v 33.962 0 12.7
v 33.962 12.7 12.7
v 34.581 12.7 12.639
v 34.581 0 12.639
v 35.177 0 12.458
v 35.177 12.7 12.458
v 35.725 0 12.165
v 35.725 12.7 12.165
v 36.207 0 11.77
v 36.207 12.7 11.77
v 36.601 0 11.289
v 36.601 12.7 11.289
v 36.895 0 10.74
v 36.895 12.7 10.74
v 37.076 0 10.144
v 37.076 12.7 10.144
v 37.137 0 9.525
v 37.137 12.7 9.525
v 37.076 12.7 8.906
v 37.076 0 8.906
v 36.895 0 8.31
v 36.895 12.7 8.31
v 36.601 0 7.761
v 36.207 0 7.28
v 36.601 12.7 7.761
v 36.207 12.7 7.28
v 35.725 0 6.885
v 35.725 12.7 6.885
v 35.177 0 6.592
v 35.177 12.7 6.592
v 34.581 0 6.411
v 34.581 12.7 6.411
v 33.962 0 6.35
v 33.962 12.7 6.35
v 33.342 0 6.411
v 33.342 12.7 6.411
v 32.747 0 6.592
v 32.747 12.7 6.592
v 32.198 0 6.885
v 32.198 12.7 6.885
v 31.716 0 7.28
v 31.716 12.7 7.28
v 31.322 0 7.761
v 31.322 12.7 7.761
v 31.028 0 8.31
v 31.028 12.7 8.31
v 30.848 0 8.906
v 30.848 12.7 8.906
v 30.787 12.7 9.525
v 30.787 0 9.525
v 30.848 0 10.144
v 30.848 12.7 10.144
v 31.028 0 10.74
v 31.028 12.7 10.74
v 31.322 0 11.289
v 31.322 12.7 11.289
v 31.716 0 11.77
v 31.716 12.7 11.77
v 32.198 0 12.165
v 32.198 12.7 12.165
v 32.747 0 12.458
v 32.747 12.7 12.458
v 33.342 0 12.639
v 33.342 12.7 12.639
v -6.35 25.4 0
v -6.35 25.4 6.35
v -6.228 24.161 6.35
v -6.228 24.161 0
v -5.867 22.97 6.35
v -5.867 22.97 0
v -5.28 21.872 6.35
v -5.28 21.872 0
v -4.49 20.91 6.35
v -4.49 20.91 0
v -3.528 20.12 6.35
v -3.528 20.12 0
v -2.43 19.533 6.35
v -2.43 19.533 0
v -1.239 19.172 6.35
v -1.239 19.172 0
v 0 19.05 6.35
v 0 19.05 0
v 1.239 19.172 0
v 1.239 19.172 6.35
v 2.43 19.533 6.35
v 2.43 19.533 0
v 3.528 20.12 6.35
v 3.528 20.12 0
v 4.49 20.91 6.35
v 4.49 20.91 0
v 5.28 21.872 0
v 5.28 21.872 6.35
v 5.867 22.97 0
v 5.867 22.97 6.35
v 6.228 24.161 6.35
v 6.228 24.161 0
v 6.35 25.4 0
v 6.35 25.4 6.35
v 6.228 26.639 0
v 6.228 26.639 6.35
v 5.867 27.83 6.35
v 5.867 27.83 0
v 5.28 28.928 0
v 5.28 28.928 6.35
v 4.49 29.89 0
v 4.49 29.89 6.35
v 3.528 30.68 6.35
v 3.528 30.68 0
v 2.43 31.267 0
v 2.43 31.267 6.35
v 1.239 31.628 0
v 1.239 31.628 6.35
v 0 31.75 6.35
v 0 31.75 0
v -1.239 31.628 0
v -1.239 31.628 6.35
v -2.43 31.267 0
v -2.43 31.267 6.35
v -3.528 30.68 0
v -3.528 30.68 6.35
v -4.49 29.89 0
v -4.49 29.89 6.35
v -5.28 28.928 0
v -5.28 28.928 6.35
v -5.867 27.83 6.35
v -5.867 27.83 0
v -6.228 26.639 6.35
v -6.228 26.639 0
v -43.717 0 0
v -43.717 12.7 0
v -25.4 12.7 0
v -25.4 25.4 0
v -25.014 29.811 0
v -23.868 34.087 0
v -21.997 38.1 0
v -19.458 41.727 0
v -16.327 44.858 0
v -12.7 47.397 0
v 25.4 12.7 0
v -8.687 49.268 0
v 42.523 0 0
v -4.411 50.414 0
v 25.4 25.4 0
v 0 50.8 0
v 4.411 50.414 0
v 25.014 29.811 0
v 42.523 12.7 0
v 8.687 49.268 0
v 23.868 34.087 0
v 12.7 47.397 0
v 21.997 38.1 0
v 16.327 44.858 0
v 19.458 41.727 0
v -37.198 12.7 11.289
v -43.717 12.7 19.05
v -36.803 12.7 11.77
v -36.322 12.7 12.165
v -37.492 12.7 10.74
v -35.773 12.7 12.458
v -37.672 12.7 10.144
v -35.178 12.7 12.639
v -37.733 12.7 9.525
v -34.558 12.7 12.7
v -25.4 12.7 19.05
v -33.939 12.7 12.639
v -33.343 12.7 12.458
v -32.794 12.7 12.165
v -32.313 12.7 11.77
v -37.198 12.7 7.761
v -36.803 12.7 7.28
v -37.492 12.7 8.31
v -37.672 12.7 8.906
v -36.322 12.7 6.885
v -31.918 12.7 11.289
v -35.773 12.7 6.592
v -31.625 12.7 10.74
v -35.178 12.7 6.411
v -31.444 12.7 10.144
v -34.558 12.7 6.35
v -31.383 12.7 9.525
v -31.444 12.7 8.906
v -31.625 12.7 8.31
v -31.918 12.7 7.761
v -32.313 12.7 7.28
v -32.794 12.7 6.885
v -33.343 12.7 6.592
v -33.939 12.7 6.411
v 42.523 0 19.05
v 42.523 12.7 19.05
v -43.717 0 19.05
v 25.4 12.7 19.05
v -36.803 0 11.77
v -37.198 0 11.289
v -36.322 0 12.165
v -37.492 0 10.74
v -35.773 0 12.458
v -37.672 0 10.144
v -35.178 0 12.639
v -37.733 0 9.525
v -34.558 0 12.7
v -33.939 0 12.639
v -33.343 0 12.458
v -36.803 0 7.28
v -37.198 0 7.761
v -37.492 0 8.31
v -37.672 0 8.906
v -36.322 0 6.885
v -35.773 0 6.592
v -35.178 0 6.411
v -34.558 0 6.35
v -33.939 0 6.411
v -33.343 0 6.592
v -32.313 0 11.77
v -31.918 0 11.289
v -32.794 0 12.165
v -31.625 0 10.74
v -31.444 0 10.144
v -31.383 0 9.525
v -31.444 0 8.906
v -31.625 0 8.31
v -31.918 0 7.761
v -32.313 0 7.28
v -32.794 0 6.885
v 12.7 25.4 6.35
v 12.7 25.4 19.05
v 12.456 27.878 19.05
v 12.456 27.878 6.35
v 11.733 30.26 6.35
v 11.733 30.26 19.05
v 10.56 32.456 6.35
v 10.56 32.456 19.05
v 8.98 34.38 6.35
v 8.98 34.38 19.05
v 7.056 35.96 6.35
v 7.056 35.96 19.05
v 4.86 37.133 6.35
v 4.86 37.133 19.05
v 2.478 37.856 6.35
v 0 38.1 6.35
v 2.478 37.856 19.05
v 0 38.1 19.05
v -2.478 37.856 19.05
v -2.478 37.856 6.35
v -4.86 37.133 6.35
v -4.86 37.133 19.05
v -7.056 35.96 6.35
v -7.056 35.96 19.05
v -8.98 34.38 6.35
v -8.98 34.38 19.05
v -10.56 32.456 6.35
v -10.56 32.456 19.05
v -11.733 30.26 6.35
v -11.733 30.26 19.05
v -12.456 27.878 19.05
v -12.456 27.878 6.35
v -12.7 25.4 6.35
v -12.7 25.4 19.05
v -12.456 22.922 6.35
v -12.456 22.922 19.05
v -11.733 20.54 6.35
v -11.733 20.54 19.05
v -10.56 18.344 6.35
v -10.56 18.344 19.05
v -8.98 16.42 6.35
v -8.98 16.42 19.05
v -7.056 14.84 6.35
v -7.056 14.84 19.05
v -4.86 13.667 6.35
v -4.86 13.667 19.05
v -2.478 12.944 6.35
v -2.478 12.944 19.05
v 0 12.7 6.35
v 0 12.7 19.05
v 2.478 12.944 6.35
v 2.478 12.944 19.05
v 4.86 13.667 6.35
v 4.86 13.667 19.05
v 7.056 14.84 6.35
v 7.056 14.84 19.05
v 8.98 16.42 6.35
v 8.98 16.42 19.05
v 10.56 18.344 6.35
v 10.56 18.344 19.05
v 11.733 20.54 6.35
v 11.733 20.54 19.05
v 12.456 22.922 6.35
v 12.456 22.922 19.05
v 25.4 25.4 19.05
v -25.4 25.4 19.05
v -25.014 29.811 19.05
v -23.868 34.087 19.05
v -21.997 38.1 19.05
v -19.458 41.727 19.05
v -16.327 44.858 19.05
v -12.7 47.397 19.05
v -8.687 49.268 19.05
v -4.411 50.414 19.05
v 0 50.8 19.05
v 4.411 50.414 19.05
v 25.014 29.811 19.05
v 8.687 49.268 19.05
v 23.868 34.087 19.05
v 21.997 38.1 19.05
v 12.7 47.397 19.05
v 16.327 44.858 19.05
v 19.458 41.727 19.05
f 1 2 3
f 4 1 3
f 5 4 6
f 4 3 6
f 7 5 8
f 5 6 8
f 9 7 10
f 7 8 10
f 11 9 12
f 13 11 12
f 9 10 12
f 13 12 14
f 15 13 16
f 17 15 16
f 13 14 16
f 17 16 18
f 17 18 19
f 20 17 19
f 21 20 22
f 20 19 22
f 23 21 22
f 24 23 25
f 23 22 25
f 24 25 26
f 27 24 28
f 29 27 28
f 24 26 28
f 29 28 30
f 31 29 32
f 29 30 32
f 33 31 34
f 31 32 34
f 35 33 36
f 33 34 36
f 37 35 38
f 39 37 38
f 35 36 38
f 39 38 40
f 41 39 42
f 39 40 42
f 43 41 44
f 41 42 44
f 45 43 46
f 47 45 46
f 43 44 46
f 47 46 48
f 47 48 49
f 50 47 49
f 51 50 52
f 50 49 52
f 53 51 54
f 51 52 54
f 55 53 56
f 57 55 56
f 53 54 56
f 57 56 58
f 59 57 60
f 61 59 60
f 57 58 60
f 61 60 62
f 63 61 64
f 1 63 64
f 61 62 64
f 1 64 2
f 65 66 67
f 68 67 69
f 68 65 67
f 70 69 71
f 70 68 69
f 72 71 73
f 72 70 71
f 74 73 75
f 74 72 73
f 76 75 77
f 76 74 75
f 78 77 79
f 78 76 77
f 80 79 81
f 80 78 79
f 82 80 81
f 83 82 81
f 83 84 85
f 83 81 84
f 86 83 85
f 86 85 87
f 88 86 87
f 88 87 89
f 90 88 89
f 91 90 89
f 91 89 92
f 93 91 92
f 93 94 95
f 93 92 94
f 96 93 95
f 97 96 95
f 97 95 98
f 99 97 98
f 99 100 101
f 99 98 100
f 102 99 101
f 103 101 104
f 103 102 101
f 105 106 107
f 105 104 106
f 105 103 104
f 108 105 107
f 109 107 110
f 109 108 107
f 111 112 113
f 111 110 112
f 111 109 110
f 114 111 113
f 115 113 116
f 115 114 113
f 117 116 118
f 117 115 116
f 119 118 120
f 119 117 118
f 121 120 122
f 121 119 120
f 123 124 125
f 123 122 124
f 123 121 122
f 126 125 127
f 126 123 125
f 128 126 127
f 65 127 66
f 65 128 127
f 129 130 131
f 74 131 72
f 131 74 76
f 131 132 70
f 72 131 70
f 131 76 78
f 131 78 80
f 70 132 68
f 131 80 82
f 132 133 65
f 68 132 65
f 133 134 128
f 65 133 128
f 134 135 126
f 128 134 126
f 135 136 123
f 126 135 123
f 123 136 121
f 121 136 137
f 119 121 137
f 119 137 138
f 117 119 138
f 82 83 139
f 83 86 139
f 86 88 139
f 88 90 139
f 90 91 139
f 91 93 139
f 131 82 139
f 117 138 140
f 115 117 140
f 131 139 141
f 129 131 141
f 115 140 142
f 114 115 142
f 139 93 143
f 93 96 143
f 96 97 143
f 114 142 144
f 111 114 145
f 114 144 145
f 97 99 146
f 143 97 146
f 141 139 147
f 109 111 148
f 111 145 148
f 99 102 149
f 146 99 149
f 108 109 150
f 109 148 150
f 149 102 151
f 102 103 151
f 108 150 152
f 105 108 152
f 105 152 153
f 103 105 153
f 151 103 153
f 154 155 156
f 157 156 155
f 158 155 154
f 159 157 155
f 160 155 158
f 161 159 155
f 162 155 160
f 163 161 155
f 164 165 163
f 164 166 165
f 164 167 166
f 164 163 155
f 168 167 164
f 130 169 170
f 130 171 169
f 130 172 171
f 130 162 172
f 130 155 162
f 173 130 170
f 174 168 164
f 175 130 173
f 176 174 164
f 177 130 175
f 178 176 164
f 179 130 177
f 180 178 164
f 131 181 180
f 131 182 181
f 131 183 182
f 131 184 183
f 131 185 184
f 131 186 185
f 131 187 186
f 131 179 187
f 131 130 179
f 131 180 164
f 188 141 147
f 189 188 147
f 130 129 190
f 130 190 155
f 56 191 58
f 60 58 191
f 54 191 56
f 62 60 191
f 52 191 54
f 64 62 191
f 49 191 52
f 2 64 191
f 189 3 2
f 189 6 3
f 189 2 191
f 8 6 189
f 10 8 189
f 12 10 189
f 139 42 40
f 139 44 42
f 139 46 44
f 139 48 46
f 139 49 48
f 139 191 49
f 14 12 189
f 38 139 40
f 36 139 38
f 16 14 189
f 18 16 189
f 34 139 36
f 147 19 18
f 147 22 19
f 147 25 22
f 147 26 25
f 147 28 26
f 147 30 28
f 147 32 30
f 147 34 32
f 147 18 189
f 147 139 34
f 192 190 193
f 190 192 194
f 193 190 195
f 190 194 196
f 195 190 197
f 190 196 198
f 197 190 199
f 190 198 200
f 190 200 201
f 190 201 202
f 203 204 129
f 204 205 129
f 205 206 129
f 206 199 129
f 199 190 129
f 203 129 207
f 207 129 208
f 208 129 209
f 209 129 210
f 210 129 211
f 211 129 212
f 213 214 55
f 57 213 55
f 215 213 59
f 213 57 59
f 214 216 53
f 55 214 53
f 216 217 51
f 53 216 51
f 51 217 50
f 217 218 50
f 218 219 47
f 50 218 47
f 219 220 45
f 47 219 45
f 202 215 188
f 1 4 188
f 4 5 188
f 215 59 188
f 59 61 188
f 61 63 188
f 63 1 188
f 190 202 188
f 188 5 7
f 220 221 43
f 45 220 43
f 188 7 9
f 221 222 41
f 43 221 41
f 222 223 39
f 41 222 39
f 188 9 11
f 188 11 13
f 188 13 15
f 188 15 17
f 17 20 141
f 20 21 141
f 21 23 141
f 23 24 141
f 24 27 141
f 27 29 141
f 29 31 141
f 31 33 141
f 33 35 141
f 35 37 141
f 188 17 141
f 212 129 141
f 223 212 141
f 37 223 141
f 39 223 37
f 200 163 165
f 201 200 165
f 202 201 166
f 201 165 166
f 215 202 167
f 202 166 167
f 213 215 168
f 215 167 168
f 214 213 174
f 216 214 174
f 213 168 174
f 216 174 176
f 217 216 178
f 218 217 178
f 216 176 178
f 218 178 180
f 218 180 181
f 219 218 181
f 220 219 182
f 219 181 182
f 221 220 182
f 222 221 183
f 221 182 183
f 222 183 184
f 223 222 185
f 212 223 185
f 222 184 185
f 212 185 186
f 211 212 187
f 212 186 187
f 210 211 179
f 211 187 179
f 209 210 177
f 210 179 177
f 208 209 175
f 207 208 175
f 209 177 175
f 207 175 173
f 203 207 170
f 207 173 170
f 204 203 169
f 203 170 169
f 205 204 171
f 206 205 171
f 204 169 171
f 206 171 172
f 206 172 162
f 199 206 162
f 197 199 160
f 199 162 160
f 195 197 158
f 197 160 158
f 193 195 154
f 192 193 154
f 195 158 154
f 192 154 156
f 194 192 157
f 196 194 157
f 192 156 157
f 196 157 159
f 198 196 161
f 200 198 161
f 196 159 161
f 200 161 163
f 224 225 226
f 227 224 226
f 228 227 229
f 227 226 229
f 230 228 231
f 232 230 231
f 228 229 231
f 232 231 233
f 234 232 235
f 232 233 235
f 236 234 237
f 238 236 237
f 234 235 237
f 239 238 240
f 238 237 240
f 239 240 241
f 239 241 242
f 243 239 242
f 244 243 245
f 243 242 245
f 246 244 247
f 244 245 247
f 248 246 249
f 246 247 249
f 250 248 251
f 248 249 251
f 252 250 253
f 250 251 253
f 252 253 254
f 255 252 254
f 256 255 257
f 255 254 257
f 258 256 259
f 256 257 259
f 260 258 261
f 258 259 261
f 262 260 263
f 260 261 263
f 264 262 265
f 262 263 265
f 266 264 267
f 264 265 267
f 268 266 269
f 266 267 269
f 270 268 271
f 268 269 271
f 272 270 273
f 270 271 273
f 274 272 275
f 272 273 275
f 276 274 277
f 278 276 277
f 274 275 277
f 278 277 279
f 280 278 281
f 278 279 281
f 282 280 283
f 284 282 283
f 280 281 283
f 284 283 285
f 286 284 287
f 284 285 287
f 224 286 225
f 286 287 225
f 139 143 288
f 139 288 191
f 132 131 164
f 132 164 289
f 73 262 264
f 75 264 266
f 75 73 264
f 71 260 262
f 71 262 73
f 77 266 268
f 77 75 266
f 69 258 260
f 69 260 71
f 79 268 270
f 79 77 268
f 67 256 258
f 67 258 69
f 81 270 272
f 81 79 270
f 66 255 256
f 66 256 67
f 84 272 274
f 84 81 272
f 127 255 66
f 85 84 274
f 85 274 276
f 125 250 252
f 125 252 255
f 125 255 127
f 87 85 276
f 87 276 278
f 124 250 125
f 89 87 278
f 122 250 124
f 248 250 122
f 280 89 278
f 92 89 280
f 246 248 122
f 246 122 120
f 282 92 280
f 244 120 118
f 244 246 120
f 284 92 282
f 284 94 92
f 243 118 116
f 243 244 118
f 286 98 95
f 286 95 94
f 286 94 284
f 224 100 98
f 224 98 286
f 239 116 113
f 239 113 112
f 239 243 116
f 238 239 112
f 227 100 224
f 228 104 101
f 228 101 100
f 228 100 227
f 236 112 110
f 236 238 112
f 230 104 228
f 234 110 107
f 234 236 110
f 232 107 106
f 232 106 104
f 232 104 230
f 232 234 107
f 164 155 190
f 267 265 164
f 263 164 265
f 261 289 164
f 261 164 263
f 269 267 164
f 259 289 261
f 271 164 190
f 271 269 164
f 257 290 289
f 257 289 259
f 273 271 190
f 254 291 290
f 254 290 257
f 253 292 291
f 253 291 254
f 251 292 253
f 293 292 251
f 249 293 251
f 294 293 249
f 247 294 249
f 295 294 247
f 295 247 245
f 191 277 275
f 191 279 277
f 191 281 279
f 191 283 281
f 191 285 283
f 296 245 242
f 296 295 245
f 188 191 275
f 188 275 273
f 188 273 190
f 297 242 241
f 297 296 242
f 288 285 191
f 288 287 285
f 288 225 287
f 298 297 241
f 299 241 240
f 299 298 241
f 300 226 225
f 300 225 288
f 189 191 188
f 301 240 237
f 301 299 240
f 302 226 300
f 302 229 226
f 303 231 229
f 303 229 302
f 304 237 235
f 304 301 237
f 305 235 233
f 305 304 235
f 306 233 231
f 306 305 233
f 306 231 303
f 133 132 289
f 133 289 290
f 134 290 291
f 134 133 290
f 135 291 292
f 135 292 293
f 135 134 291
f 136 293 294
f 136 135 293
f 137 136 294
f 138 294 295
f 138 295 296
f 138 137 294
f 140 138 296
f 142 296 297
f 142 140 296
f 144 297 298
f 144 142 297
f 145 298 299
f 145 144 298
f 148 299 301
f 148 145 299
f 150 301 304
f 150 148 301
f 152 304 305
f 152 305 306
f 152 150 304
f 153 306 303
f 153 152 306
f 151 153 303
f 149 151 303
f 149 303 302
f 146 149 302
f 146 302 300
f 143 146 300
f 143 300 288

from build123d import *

# Parameters (mm, degrees)
SKETCH1_R           = 6.35
SKETCH1_W           = 18.316719234
SKETCH1_H           = 12.7
SKETCH1_W_2         = 17.123051237
BOSS_EXTRUDE1_DEPTH = 19.05
SKETCH2_R           = 12.7
CUT_EXTRUDE1_DEPTH  = 12.7
SKETCH3_R           = 3.175
CUT_EXTRUDE2_DEPTH  = 12.7


with BuildPart() as part:
    # Sketch1 → Boss-Extrude1 (new body)
    # profile 1 of 3: a face of its own
    with BuildSketch(Plane.XY):
        with BuildLine():
            Line((25.4, 25.4), (25.4, 0))
            Line((25.4, 0), (-25.4, 0))
            Line((-25.4, 0), (-25.4, 25.4))
            ThreePointArc((-25.4, 25.4), (0, 50.8), (25.4, 25.4))
        make_face()
        with Locations(Location((0, 25.4, 0), (0, 0, 180))):
            Circle(SKETCH1_R, mode=Mode.SUBTRACT)
    # profile 2 of 3: a face of its own
    with BuildSketch(Plane.XY):
        with Locations((-34.558359617, 6.35)):
            Rectangle(SKETCH1_W, SKETCH1_H)
    # profile 3 of 3: a face of its own
    with BuildSketch(Plane.XY):
        with Locations((33.961525619, 6.35)):
            Rectangle(SKETCH1_W_2, SKETCH1_H)
    extrude(amount=BOSS_EXTRUDE1_DEPTH)

    # Sketch2 → Cut-Extrude1 (cut)
    with BuildSketch(Plane.XY.offset(19.05)):
        with Locations((0, 25.4)):
            Circle(SKETCH2_R)
    extrude(amount=-CUT_EXTRUDE1_DEPTH, mode=Mode.SUBTRACT)

    # Sketch3 → Cut-Extrude2 (cut)
    with BuildSketch(Plane(origin=(0, 12.7, 0), x_dir=(1, 0, 0), z_dir=(0, 1, 0))):
        with Locations(Location((-34.558359617, -9.525, 0), (0, 0, 270))):
            Circle(SKETCH3_R)
        with Locations(Location((33.961525618, -9.525, 0), (0, 0, 270))):
            Circle(SKETCH3_R)
    extrude(amount=-CUT_EXTRUDE2_DEPTH, mode=Mode.SUBTRACT)


solid = part.part
